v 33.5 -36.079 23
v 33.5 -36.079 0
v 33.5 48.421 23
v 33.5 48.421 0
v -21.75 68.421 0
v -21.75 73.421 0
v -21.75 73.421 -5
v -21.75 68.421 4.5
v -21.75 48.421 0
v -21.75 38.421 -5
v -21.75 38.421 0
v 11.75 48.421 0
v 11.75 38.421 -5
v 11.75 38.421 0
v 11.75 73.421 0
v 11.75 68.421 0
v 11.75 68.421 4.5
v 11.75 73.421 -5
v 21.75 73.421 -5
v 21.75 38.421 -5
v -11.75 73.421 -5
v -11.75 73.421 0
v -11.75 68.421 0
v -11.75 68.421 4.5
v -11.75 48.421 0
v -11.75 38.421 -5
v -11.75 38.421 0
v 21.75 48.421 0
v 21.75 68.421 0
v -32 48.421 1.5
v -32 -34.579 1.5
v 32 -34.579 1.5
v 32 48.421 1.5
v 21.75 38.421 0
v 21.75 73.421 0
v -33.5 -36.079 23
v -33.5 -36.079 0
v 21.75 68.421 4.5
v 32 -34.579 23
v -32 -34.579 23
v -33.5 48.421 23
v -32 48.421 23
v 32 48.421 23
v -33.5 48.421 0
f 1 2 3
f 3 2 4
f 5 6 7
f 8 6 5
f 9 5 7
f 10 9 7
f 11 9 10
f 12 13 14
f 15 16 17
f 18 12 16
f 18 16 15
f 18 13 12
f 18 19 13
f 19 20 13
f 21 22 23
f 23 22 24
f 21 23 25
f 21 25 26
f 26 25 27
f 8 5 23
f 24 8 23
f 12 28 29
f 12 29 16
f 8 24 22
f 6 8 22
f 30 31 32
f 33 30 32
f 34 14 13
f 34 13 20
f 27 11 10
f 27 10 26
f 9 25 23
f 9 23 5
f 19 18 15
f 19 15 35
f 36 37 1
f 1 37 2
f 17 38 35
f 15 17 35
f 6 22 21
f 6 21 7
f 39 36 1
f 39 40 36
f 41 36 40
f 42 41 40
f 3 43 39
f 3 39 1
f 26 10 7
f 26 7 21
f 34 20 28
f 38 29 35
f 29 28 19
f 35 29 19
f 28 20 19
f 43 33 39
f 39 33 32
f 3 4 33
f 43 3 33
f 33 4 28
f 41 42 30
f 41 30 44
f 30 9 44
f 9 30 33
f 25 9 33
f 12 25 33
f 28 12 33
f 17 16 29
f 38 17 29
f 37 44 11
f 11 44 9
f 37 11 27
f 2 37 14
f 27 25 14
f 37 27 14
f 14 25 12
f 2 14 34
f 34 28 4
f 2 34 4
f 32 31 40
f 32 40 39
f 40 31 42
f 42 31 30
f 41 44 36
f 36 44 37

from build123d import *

# Parameters (mm, degrees)
F0_W      = 64
F0_H      = 1.5
F1_DEPTH  = 23
F0_H_2    = 83
F2_DEPTH  = 1.5
F3_W      = 10
F3_H      = 10
F4_DEPTH  = 5
F5_W      = 10
F5_H      = 5
F6_DEPTH  = 25
F7_W      = 10
F7_H      = 5
F8_DEPTH  = 5
F10_DEPTH = 47.7


with BuildPart() as f1:
    # F0 (on Top) → F1 (new body)
    with BuildSketch(Plane.XY):
        Polygon((-32, 48.42079), (-33.5, 48.42079), (-33.5, -36.07921), (-32, -36.07921), (-32, -34.57921), align=None)
        with Locations((0, -35.32921)):
            Rectangle(F0_W, F0_H)
        Polygon((33.5, 48.42079), (32, 48.42079), (32, -34.57921), (32, -36.07921), (33.5, -36.07921), align=None)
    extrude(amount=F1_DEPTH)

    # F0 (on Top) → F2 (join)
    with BuildSketch(Plane.XY):
        Polygon((-32, 48.42079), (-33.5, 48.42079), (-33.5, -36.07921), (-32, -36.07921), (-32, -34.57921), align=None)
        with Locations((0, 6.92079)):
            Rectangle(F0_W, F0_H_2)
        Polygon((33.5, 48.42079), (32, 48.42079), (32, -34.57921), (32, -36.07921), (33.5, -36.07921), align=None)
        with Locations((0, -35.32921)):
            Rectangle(F0_W, F0_H)
    extrude(amount=F2_DEPTH)

    # F3 (on face) → F4 (join)
    with BuildSketch(Plane(origin=(0, 0, 0), x_dir=(1, 0, 0), z_dir=(0, 0, -1))):
        with Locations((16.75, -43.42079)):
            Rectangle(F3_W, F3_H)
        with Locations((-16.75, -43.42079)):
            Rectangle(F3_W, F3_H)
    extrude(amount=F4_DEPTH)

    # F5 (on face) → F6 (join)
    with BuildSketch(Plane(origin=(0, 48.42079, 0), x_dir=(-1, 0, 0), z_dir=(0, 1, 0))):
        with Locations((-16.75, -2.5)):
            Rectangle(F5_W, F5_H)
        with Locations((16.75, -2.5)):
            Rectangle(F5_W, F5_H)
    extrude(amount=F6_DEPTH)

    # F7 (on face) → F8 (join)
    with BuildSketch(Plane.XY):
        with Locations((16.75, 70.92079)):
            Rectangle(F7_W, F7_H)
        with Locations((-16.75, 70.92079)):
            Rectangle(F7_W, F7_H)
    extrude(amount=F8_DEPTH)

    # F9 (on face) → F10 (cut)
    with BuildSketch(Plane.YZ.offset(21.75)):
        Polygon((73.42079, 5), (68.42079, 5), (68.42079, 4.5), (73.42079, 0), align=None)
    extrude(amount=-F10_DEPTH, mode=Mode.SUBTRACT)


with BuildPart() as f11_1:
    # F11: copy of F1
    add(f1.part)


solid = f11_1.part
